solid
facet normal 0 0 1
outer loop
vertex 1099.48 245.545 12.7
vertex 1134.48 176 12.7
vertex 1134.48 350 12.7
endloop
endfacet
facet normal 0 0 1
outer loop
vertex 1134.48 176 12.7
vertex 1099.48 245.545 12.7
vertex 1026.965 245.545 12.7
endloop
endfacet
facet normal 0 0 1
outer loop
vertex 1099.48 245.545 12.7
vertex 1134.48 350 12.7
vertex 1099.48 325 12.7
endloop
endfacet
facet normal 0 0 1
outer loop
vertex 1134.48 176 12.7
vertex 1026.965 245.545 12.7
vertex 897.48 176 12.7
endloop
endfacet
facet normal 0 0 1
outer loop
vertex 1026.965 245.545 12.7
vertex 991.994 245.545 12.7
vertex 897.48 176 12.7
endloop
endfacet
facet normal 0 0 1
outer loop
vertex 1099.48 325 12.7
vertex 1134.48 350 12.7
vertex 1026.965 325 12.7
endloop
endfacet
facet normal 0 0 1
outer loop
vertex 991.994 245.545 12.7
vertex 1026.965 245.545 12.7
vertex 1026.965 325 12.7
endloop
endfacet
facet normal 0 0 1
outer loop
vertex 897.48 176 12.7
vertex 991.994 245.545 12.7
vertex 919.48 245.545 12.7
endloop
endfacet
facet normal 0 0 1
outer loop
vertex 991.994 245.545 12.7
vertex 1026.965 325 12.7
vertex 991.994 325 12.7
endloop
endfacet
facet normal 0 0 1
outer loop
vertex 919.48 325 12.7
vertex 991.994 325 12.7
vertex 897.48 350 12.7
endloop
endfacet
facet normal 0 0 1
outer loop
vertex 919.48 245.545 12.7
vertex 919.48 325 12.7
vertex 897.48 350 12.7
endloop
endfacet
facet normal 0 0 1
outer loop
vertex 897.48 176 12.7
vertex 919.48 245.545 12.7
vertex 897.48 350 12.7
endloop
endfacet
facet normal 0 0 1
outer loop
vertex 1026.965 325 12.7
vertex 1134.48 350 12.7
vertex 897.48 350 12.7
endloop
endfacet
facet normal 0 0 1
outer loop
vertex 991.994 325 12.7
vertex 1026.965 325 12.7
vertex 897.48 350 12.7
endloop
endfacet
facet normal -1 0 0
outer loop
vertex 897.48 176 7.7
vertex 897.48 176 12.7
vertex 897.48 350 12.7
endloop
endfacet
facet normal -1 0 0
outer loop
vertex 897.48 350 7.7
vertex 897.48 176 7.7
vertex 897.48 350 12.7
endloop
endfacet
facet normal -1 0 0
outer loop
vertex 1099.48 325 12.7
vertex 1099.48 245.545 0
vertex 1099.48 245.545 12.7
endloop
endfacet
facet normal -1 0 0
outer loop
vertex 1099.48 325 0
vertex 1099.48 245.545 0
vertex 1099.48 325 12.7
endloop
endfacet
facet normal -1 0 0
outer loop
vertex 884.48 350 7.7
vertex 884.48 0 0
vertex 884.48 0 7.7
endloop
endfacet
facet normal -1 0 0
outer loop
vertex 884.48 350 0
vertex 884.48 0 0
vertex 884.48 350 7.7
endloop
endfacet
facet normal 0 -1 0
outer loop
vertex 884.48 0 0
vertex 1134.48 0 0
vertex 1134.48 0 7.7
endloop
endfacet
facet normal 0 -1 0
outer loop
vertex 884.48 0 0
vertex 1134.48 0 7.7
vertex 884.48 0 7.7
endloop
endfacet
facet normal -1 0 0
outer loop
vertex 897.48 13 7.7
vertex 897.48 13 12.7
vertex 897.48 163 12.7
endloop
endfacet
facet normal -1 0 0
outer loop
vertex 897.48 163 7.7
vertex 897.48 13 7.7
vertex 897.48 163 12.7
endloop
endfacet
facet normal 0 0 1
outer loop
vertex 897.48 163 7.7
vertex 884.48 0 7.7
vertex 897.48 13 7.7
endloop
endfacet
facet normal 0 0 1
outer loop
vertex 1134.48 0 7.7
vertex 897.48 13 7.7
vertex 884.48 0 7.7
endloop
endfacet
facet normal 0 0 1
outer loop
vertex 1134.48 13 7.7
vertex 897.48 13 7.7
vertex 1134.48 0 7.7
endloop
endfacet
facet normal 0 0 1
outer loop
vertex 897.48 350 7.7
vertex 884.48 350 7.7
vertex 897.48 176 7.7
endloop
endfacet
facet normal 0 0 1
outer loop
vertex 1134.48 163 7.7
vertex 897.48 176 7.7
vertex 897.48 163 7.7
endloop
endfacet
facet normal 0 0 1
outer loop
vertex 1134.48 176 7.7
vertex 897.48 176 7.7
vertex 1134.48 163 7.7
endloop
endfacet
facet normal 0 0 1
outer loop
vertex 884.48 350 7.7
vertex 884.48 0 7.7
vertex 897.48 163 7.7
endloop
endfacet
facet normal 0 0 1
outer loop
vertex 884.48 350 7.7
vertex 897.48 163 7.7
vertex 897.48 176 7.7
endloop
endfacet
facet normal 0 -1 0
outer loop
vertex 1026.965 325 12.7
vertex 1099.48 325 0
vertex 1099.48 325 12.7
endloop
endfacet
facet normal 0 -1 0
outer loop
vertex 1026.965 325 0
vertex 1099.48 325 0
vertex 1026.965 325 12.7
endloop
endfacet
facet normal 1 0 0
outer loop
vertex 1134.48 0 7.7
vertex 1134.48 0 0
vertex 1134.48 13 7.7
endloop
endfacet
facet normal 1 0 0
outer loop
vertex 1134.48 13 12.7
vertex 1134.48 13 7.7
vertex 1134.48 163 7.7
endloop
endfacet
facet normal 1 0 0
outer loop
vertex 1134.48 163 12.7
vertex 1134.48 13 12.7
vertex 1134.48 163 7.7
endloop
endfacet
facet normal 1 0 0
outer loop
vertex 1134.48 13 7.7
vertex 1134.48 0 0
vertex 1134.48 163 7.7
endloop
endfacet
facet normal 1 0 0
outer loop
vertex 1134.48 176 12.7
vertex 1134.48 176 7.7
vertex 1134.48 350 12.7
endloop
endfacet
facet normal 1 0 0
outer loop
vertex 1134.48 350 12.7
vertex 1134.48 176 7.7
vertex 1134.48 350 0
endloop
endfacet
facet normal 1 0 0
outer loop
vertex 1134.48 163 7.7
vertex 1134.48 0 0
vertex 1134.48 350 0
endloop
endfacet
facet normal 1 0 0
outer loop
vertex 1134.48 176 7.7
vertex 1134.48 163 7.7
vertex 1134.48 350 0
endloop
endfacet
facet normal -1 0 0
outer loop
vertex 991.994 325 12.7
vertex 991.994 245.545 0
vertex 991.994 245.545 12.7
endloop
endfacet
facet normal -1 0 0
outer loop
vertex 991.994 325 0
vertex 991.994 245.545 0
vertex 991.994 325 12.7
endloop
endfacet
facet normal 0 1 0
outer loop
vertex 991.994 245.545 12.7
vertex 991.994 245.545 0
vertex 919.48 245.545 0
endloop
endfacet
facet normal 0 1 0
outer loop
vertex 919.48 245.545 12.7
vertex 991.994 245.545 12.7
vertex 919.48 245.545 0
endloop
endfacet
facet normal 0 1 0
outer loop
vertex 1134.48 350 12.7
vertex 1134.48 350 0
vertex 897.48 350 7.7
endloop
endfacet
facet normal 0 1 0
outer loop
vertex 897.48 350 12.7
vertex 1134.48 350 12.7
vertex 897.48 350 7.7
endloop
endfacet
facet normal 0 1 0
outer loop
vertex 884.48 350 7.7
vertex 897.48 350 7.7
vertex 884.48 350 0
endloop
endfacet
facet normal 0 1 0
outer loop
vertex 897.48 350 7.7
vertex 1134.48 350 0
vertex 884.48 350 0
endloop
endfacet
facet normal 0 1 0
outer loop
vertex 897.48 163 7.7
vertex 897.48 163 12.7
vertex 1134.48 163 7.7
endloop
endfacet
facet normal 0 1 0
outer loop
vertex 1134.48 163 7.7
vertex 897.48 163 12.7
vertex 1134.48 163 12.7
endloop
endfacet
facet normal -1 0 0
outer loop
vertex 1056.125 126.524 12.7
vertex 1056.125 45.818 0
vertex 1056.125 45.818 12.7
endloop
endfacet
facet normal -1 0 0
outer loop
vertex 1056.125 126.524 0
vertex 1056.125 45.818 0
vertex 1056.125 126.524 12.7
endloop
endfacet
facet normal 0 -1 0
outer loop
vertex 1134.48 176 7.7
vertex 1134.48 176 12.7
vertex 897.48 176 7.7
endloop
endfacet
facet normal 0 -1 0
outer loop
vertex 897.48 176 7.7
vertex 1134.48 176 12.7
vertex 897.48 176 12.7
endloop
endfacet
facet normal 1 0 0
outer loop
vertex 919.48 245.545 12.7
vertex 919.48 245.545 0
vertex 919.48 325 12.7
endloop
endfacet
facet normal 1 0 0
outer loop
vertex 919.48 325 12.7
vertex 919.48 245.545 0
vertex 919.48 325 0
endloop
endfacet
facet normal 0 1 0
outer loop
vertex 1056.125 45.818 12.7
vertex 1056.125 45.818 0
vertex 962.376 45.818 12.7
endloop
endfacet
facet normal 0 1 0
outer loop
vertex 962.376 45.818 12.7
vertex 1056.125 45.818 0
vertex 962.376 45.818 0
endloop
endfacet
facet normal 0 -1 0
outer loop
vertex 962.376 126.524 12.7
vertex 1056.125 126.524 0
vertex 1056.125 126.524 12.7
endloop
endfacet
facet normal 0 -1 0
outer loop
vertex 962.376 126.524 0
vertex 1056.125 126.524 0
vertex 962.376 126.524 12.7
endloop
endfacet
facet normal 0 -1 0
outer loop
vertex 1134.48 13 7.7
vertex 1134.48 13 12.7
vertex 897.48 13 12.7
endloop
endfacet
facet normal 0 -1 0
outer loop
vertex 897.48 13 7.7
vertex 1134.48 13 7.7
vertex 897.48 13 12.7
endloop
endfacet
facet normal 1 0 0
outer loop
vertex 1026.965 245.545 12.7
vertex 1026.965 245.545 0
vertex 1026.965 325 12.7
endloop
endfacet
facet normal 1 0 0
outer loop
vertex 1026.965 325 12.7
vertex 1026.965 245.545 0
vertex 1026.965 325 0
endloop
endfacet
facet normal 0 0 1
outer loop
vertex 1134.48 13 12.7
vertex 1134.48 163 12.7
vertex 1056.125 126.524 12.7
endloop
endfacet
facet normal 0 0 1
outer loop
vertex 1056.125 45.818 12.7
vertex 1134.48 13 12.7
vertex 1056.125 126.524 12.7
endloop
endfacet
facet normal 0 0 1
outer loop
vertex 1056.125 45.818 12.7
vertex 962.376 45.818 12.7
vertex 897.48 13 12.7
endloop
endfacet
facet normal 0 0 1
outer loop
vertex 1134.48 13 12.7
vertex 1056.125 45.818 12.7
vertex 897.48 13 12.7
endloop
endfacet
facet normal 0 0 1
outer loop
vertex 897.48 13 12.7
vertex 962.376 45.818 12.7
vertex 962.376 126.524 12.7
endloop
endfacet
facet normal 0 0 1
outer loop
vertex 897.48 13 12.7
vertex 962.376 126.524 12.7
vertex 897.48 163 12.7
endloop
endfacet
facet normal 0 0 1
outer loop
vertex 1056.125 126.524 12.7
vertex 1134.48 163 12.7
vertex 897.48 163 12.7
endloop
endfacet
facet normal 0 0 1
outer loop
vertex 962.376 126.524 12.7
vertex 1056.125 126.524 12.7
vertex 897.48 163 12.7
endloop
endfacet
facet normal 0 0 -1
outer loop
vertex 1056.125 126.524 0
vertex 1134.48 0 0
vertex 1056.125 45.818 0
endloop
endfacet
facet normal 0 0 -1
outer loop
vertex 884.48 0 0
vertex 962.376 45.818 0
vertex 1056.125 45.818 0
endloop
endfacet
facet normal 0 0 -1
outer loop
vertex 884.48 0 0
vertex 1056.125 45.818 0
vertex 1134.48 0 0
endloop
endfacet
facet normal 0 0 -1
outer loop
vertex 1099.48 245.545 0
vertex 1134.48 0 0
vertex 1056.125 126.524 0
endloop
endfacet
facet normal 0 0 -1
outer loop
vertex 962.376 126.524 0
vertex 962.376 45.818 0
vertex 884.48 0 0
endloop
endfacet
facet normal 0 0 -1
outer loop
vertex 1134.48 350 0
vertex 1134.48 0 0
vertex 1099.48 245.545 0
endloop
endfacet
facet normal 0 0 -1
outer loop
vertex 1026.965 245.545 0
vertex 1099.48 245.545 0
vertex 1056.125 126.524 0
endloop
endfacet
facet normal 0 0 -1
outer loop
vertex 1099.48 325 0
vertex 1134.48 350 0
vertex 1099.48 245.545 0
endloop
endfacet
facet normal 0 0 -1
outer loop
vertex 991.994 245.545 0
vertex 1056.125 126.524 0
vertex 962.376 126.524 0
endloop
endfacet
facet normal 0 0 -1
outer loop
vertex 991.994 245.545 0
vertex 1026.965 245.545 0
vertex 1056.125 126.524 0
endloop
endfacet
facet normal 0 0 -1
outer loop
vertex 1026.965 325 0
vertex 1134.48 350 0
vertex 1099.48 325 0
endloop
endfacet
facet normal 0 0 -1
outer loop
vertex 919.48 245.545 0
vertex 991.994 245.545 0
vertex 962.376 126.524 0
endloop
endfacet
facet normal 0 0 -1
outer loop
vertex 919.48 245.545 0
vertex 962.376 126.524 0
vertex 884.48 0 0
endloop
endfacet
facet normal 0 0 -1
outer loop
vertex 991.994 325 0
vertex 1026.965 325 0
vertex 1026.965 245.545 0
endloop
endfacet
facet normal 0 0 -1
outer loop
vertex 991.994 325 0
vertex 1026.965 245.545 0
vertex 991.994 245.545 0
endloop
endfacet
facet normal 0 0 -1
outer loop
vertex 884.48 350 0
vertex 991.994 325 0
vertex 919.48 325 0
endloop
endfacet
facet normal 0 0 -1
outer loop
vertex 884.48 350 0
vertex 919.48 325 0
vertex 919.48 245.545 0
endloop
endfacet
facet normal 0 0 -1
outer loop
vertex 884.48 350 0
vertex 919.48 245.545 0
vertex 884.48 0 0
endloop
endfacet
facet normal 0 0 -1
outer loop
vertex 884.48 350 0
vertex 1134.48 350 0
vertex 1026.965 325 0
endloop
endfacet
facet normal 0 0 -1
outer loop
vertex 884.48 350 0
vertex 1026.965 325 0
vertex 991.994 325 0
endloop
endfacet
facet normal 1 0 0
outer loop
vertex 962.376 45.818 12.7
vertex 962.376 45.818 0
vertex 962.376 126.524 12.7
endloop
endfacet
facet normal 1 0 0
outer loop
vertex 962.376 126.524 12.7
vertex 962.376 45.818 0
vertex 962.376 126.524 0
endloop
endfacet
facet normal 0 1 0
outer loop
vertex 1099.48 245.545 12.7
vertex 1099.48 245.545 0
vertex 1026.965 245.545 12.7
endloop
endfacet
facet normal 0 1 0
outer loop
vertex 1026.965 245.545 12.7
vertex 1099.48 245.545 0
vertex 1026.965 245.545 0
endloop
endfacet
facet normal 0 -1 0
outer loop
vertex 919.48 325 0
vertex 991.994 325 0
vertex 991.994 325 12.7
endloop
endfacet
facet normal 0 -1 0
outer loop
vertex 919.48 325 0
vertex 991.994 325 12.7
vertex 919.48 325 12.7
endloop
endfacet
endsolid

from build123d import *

# Parameters (mm, degrees)
SKETCH004_W   = 250
SKETCH004_H   = 350
SKETCH004_W_2 = 72.514309
SKETCH004_H_2 = 79.45462
SKETCH004_W_3 = 72.51431
SKETCH004_W_4 = 93.749451
SKETCH004_H_3 = 80.706021
PAD004_DEPTH  = 12.7
POCKET_DEPTH  = 5


with BuildPart() as lside:
    # Sketch004 → Pad004 (new body)
    with BuildSketch(Plane.XY):
        with Locations((749.003465, 175)):
            Rectangle(SKETCH004_W, SKETCH004_H)
        with Locations((695.260619, 285.27269)):
            Rectangle(SKETCH004_W_2, SKETCH004_H_2, mode=Mode.SUBTRACT)
        with Locations((802.74631, 285.27269)):
            Rectangle(SKETCH004_W_3, SKETCH004_H_2, mode=Mode.SUBTRACT)
        with Locations((749.232575, 86.171351)):
            Rectangle(SKETCH004_W_4, SKETCH004_H_3, mode=Mode.SUBTRACT)
    extrude(amount=PAD004_DEPTH)

    # Sketch005 (on Face18 of Pad004) → Pocket (cut)
    with BuildSketch(Plane.XY.offset(12.7)):
        Polygon((609.961363, 176), (861.003465, 176), (861.003465, 350), (874.003465, 350), (874.003465, 0), (614.691284, 0), (614.691284, 13), (861.003465, 13), (861.003465, 163), (609.961363, 163), align=None)
    extrude(amount=-POCKET_DEPTH, mode=Mode.SUBTRACT)


with BuildPart() as model_lside_mirrored:
    # Mirror: instance of LSide
    add(lside.part.mirror(Plane(origin=(879.241577, 357.188568, 0), x_dir=(0, 1, 0), z_dir=(-1, 0, 0))))


solid = model_lside_mirrored.part
